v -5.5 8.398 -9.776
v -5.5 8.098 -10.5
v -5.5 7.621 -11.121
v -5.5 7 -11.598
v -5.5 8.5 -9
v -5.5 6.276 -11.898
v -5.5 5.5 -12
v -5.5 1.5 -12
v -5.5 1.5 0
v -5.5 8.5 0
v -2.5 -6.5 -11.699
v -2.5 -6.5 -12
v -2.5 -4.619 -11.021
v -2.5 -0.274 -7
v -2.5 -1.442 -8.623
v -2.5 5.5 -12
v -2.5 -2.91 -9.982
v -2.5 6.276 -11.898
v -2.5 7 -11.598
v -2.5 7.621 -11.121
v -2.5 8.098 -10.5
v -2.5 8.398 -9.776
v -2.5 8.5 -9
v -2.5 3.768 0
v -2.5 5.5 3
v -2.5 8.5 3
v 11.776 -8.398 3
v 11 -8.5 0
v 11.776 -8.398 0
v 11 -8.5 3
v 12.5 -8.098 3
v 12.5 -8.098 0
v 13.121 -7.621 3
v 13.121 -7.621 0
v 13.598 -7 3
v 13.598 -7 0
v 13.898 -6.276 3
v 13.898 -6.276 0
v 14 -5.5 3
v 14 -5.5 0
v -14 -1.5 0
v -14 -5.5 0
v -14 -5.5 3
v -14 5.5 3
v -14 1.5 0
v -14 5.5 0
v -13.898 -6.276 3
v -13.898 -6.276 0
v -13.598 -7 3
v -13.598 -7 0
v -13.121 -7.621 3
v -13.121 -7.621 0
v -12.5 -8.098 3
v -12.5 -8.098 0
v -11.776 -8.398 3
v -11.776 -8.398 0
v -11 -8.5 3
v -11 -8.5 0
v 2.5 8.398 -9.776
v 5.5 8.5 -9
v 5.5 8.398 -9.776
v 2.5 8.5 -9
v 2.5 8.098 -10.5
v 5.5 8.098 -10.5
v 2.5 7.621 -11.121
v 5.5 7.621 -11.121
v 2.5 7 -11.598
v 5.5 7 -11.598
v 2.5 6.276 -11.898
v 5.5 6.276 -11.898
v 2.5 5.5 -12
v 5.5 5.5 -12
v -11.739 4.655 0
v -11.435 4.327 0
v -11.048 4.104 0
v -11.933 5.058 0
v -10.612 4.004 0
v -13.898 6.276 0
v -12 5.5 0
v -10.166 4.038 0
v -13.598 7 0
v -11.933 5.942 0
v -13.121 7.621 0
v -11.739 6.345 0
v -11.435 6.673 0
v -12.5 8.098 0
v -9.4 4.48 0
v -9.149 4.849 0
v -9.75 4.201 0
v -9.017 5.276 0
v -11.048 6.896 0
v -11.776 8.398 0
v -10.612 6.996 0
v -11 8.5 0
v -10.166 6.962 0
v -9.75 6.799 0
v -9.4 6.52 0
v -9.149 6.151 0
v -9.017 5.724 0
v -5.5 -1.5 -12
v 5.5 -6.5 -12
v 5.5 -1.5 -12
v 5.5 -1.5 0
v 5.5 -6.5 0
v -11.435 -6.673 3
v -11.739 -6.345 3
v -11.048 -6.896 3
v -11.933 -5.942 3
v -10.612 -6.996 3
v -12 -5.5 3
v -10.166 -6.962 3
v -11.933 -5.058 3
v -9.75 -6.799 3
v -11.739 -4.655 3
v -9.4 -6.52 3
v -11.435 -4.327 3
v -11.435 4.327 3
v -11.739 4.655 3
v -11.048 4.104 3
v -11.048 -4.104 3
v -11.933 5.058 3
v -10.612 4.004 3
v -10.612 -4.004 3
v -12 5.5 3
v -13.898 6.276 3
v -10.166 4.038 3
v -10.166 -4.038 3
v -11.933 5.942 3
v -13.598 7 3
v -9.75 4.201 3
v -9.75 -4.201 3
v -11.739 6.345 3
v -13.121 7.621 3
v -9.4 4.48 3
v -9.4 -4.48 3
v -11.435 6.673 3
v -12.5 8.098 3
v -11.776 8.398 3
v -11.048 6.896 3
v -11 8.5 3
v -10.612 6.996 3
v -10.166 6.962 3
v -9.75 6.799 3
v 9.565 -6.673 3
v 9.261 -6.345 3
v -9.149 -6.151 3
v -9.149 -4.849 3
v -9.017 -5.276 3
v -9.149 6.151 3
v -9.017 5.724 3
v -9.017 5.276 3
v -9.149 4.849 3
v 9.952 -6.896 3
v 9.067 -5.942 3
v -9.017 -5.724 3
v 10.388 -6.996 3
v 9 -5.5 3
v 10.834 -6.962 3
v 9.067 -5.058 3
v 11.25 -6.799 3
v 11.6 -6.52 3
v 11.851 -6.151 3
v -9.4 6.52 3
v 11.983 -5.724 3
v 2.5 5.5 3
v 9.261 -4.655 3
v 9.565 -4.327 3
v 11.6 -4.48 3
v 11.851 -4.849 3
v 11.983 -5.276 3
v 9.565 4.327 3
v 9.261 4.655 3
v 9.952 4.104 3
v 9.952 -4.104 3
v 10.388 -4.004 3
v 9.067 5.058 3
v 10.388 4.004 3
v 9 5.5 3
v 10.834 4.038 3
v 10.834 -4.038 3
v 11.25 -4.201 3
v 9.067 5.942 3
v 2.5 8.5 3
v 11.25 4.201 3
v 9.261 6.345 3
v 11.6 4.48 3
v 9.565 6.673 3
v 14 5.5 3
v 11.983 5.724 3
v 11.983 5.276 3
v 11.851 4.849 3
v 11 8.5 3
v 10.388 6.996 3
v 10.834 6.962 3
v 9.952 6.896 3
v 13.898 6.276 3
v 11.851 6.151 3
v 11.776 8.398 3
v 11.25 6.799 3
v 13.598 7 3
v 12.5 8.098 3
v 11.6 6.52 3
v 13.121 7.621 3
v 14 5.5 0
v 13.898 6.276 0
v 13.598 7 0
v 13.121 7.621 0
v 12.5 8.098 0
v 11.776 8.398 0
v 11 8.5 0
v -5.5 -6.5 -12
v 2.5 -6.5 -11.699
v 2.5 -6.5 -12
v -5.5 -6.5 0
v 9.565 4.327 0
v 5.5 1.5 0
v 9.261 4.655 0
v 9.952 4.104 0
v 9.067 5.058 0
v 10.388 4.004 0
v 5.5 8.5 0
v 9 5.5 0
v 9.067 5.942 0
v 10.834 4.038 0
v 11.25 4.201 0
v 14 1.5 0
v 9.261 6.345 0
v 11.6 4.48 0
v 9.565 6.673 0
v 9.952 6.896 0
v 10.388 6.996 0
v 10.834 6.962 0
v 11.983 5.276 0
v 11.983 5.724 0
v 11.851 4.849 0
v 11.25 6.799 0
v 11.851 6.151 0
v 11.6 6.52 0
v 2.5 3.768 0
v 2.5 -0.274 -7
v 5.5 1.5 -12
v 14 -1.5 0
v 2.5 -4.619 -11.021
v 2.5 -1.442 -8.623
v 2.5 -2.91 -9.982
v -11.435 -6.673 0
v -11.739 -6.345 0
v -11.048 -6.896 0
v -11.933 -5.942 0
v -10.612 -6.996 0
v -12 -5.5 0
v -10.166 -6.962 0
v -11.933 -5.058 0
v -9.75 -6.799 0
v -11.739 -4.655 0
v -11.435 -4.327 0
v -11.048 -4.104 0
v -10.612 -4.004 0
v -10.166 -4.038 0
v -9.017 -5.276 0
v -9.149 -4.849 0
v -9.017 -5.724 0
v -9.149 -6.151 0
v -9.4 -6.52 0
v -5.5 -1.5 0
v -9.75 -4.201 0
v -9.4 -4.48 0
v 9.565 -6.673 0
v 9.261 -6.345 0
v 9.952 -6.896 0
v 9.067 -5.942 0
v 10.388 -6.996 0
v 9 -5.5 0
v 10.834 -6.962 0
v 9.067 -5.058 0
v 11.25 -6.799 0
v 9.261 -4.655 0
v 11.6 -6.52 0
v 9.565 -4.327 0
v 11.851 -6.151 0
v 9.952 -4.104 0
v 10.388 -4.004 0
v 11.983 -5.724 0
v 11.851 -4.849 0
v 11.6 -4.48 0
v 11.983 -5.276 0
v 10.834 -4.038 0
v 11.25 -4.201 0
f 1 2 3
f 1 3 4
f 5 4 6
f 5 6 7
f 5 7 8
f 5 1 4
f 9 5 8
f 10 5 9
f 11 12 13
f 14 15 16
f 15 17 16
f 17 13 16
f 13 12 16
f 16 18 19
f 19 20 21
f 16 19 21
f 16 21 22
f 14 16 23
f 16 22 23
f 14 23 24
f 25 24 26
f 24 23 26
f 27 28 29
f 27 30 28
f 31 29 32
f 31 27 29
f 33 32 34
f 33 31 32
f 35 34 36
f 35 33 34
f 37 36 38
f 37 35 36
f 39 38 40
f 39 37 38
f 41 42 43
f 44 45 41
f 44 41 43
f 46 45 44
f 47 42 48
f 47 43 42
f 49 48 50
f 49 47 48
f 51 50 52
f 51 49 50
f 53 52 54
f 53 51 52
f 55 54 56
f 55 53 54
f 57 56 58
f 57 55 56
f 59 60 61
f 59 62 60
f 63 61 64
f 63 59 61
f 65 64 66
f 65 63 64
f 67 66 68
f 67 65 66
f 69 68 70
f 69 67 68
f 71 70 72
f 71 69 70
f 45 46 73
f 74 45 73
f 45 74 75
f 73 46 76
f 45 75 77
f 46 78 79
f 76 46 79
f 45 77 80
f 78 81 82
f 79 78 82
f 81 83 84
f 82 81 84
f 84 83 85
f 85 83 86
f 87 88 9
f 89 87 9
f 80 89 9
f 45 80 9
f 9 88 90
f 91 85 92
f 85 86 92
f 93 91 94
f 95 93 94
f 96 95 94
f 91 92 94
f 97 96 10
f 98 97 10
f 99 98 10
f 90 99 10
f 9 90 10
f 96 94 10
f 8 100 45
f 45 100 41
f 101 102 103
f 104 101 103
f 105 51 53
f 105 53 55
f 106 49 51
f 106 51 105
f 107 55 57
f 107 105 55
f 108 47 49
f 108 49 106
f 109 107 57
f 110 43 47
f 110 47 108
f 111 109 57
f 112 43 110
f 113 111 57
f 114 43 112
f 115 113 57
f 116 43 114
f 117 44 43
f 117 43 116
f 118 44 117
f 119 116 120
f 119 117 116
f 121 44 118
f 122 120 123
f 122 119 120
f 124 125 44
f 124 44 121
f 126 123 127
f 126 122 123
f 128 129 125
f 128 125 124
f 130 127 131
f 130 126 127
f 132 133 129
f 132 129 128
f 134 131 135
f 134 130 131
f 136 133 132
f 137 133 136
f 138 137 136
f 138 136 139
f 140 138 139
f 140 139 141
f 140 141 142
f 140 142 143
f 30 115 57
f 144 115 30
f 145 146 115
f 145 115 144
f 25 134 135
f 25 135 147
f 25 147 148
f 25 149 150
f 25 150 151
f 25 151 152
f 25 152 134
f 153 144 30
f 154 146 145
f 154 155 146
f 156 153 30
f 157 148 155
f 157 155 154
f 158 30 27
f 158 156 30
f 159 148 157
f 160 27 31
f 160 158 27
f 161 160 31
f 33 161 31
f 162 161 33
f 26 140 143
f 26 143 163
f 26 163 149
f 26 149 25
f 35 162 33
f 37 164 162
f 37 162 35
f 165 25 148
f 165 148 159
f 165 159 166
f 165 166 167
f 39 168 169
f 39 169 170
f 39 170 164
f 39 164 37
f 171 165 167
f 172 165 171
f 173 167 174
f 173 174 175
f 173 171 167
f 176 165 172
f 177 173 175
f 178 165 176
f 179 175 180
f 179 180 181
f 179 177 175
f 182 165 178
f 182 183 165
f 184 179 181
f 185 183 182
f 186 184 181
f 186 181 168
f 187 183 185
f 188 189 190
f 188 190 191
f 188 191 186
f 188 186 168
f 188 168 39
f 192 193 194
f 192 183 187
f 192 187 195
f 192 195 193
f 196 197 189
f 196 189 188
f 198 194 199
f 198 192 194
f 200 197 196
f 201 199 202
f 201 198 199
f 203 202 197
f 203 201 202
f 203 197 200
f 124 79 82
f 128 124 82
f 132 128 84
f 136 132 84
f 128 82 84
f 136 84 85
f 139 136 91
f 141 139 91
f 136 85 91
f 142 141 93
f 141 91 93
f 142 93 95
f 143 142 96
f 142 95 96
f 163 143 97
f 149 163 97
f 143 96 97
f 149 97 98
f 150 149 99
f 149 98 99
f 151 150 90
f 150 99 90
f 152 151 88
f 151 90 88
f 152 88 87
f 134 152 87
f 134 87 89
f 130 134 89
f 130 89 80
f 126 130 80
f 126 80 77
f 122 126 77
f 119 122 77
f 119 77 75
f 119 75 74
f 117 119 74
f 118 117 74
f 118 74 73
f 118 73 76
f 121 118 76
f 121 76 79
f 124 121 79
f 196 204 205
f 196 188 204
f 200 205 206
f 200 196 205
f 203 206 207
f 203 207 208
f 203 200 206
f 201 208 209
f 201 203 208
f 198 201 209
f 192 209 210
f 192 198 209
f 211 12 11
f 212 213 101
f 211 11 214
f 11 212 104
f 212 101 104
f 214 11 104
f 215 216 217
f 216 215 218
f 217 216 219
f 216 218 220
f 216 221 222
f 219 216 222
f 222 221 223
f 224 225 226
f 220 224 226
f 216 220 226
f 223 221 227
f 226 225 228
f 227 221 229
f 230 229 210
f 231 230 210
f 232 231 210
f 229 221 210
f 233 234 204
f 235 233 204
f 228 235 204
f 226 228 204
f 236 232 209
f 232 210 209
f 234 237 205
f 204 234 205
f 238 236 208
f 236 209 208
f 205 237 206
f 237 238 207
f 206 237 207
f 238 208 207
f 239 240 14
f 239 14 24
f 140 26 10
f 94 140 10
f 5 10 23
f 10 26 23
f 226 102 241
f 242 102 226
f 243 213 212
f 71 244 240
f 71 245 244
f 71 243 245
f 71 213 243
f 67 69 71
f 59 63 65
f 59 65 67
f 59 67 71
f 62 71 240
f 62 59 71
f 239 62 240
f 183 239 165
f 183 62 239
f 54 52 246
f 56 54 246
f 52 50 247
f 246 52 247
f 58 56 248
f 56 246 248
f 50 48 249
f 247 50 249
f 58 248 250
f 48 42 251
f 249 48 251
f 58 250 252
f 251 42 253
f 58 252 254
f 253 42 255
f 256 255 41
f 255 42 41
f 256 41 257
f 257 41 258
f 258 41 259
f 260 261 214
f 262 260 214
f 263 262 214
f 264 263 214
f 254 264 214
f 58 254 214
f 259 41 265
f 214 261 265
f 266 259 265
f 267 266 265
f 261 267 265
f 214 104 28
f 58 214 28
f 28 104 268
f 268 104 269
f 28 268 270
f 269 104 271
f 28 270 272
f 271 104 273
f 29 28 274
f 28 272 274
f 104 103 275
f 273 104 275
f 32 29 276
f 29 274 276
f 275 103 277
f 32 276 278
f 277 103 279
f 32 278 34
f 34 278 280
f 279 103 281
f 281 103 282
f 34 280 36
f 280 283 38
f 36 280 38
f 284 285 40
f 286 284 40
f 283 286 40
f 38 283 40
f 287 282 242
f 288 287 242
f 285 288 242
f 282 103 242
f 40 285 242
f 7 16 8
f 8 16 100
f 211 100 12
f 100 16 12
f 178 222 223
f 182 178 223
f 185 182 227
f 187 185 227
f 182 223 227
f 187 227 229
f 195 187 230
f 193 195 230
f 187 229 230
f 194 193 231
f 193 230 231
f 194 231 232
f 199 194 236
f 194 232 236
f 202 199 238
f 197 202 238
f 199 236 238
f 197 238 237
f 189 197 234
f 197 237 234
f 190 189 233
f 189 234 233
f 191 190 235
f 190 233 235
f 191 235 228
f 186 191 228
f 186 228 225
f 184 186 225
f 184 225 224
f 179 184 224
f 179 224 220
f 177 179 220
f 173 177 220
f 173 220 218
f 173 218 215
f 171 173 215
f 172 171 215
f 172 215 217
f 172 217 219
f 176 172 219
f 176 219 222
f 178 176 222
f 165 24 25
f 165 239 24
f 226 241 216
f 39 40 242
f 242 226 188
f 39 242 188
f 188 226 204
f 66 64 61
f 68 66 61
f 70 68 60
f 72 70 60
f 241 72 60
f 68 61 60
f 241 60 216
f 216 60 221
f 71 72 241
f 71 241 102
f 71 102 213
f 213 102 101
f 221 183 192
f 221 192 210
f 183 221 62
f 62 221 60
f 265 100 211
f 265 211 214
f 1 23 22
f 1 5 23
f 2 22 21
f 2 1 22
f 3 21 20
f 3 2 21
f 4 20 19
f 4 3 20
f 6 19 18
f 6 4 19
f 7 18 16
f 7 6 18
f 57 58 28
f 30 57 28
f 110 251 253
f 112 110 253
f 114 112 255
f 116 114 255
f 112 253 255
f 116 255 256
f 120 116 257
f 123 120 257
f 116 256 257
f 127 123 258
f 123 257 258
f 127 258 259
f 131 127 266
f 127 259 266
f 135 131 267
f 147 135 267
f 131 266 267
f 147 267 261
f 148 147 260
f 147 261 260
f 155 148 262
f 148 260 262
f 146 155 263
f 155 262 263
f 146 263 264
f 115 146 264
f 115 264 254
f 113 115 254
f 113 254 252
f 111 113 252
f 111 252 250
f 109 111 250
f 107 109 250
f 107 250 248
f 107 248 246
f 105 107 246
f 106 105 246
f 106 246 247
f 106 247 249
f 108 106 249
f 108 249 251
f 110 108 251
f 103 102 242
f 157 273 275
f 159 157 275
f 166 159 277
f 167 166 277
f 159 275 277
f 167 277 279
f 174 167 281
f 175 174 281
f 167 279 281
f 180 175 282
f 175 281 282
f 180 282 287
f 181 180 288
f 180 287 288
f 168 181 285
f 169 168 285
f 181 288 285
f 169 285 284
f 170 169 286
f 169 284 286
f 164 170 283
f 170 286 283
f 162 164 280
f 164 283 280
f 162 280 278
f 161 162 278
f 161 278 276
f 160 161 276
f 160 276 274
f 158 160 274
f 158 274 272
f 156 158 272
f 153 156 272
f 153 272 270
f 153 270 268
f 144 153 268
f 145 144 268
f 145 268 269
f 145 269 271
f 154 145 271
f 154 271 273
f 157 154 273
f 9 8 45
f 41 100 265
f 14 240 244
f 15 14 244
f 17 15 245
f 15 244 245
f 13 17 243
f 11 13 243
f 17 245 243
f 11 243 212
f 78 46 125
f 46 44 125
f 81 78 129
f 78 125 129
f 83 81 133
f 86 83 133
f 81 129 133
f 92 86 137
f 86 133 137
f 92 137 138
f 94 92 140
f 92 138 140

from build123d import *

# Parameters (mm, degrees)
SKETCH_1_W          = 28
SKETCH_1_H          = 17
EXTRUDE_1_DEPTH     = 3
EXTRUDE_2_DEPTH     = 5.5
CUT_EXTRUDE_1_DEPTH = 2.5
RIB_4_REACH         = 22.304
SKETCH_5_WALL_W     = 57.313322178
SKETCH_5_WALL_H     = 3
FILLET_1_R          = 3
SKETCH_6_R          = 1.5
CUT_EXTRUDE_2_DEPTH = 5.3
EXTRUDE_3_DEPTH     = 5.5
CUT_EXTRUDE_3_DEPTH = 2.5
FILLET_3_R          = 3
FILLET_4_R          = 10


with BuildPart() as part:
    # 草图1 → 凸台-拉伸1 (new body)
    with BuildSketch(Plane.XY):
        Rectangle(SKETCH_1_W, SKETCH_1_H)
    extrude(amount=EXTRUDE_1_DEPTH)

    # 草图3 → 凸台-拉伸2 (add, symmetric)
    with BuildSketch(Plane(origin=(0, 0, 0), x_dir=(0, 0, -1), z_dir=(1, 0, 0))):
        Polygon((0, 8.5), (12, 1.57179677), (12, -6.5), (0, -6.5), (0, 1.57179677), align=None)
    extrude(amount=EXTRUDE_2_DEPTH, both=True)

    # 草图4 → 切除-拉伸1 (cut, symmetric)
    with BuildSketch(Plane(origin=(0, 0, 0), x_dir=(0, 0, -1), z_dir=(1, 0, 0))):
        Polygon((0, 8.5), (12, 1.57179677), (12, -3.160254038), (0, 3.767949192), (-3, 5.5), (-3, 10.232050808), align=None)
    extrude(amount=CUT_EXTRUDE_1_DEPTH, both=True, mode=Mode.SUBTRACT)

    # 草图5 wall → 筋4 (add, up to next)
    with BuildSketch(Plane(origin=(9.75, 0, -6), x_dir=(0.57801734078, 0, 0.816024481102), z_dir=(0.816024481102, 0, -0.57801734078)), mode=Mode.PRIVATE) as rib_4_sk1:
        Rectangle(SKETCH_5_WALL_W, SKETCH_5_WALL_H)
    rib_4_tool1 = extrude(rib_4_sk1.sketch, amount=-RIB_4_REACH, mode=Mode.PRIVATE) - part.part
    rib_4 = rib_4_tool1.solids().sort_by_distance((9.75, 0, -6))[0]
    add(rib_4)

    # 镜向1: 筋4 across plane
    add(rib_4.mirror(Plane(origin=(0, 0, 0), x_dir=(0, 0, 1), z_dir=(1, 0, 0))))

    # 圆角1
    fillet_1_edges = [part.edges().sort_by_distance(p)[0] for p in [
        (14, -8.5, 1.5),
        (-14, -8.5, 1.5),
        (-14, 8.5, 1.5),
        (14, 8.5, 1.5),
    ]]
    fillet(fillet_1_edges, radius=FILLET_1_R)

    # 草图6 → 切除-拉伸2 (cut)
    with BuildSketch(Plane(origin=(0, 0, 0), x_dir=(-1, 0, 0), z_dir=(0, 0, -1))):
        with Locations((-10.5, 5.5)):
            Circle(SKETCH_6_R)
        with Locations((10.5, 5.5)):
            Circle(SKETCH_6_R)
        with Locations((10.5, -5.5)):
            Circle(SKETCH_6_R)
        with Locations((-10.5, -5.5)):
            Circle(SKETCH_6_R)
    extrude(amount=-CUT_EXTRUDE_2_DEPTH, mode=Mode.SUBTRACT)

    # 草图7 → 凸台-拉伸3 (add, symmetric)
    with BuildSketch(Plane(origin=(0, 0, 0), x_dir=(0, 0, -1), z_dir=(1, 0, 0))):
        Polygon((0, 8.5), (12, 8.5), (12, 1.57179677), align=None)
    extrude(amount=EXTRUDE_3_DEPTH, both=True)

    # 草图7<2> → 切除-拉伸3 (cut, symmetric)
    with BuildSketch(Plane(origin=(0, 0, 0), x_dir=(0, 0, -1), z_dir=(1, 0, 0))):
        Polygon((0, 8.5), (12, 8.5), (12, 1.57179677), align=None)
    extrude(amount=CUT_EXTRUDE_3_DEPTH, both=True, mode=Mode.SUBTRACT)

    # 圆角3
    fillet_3_edges = [part.edges().sort_by_distance(p)[0] for p in [
        (4, 8.5, -12),
        (-4, 8.5, -12),
    ]]
    fillet(fillet_3_edges, radius=FILLET_3_R)

    # 圆角4
    # the kernel refuses this fillet: 10 mm, written as the material it takes off along each edge
    with BuildSketch(Plane(origin=(2.5, -3.160254038, -12), x_dir=(0, -1, 0), z_dir=(-1, 0, 0))) as fillet_4_piece_1:
        with BuildLine():
            CenterArc((FILLET_4_R * 0.57735026919, FILLET_4_R), FILLET_4_R, 210, 60)
            Line((-FILLET_4_R * 0.288675134595, FILLET_4_R * 0.5), (0, 0))
            Line((0, 0), (FILLET_4_R * 0.57735026919, 0))
        make_face()
    extrude(amount=5, mode=Mode.SUBTRACT)


solid = part.part
